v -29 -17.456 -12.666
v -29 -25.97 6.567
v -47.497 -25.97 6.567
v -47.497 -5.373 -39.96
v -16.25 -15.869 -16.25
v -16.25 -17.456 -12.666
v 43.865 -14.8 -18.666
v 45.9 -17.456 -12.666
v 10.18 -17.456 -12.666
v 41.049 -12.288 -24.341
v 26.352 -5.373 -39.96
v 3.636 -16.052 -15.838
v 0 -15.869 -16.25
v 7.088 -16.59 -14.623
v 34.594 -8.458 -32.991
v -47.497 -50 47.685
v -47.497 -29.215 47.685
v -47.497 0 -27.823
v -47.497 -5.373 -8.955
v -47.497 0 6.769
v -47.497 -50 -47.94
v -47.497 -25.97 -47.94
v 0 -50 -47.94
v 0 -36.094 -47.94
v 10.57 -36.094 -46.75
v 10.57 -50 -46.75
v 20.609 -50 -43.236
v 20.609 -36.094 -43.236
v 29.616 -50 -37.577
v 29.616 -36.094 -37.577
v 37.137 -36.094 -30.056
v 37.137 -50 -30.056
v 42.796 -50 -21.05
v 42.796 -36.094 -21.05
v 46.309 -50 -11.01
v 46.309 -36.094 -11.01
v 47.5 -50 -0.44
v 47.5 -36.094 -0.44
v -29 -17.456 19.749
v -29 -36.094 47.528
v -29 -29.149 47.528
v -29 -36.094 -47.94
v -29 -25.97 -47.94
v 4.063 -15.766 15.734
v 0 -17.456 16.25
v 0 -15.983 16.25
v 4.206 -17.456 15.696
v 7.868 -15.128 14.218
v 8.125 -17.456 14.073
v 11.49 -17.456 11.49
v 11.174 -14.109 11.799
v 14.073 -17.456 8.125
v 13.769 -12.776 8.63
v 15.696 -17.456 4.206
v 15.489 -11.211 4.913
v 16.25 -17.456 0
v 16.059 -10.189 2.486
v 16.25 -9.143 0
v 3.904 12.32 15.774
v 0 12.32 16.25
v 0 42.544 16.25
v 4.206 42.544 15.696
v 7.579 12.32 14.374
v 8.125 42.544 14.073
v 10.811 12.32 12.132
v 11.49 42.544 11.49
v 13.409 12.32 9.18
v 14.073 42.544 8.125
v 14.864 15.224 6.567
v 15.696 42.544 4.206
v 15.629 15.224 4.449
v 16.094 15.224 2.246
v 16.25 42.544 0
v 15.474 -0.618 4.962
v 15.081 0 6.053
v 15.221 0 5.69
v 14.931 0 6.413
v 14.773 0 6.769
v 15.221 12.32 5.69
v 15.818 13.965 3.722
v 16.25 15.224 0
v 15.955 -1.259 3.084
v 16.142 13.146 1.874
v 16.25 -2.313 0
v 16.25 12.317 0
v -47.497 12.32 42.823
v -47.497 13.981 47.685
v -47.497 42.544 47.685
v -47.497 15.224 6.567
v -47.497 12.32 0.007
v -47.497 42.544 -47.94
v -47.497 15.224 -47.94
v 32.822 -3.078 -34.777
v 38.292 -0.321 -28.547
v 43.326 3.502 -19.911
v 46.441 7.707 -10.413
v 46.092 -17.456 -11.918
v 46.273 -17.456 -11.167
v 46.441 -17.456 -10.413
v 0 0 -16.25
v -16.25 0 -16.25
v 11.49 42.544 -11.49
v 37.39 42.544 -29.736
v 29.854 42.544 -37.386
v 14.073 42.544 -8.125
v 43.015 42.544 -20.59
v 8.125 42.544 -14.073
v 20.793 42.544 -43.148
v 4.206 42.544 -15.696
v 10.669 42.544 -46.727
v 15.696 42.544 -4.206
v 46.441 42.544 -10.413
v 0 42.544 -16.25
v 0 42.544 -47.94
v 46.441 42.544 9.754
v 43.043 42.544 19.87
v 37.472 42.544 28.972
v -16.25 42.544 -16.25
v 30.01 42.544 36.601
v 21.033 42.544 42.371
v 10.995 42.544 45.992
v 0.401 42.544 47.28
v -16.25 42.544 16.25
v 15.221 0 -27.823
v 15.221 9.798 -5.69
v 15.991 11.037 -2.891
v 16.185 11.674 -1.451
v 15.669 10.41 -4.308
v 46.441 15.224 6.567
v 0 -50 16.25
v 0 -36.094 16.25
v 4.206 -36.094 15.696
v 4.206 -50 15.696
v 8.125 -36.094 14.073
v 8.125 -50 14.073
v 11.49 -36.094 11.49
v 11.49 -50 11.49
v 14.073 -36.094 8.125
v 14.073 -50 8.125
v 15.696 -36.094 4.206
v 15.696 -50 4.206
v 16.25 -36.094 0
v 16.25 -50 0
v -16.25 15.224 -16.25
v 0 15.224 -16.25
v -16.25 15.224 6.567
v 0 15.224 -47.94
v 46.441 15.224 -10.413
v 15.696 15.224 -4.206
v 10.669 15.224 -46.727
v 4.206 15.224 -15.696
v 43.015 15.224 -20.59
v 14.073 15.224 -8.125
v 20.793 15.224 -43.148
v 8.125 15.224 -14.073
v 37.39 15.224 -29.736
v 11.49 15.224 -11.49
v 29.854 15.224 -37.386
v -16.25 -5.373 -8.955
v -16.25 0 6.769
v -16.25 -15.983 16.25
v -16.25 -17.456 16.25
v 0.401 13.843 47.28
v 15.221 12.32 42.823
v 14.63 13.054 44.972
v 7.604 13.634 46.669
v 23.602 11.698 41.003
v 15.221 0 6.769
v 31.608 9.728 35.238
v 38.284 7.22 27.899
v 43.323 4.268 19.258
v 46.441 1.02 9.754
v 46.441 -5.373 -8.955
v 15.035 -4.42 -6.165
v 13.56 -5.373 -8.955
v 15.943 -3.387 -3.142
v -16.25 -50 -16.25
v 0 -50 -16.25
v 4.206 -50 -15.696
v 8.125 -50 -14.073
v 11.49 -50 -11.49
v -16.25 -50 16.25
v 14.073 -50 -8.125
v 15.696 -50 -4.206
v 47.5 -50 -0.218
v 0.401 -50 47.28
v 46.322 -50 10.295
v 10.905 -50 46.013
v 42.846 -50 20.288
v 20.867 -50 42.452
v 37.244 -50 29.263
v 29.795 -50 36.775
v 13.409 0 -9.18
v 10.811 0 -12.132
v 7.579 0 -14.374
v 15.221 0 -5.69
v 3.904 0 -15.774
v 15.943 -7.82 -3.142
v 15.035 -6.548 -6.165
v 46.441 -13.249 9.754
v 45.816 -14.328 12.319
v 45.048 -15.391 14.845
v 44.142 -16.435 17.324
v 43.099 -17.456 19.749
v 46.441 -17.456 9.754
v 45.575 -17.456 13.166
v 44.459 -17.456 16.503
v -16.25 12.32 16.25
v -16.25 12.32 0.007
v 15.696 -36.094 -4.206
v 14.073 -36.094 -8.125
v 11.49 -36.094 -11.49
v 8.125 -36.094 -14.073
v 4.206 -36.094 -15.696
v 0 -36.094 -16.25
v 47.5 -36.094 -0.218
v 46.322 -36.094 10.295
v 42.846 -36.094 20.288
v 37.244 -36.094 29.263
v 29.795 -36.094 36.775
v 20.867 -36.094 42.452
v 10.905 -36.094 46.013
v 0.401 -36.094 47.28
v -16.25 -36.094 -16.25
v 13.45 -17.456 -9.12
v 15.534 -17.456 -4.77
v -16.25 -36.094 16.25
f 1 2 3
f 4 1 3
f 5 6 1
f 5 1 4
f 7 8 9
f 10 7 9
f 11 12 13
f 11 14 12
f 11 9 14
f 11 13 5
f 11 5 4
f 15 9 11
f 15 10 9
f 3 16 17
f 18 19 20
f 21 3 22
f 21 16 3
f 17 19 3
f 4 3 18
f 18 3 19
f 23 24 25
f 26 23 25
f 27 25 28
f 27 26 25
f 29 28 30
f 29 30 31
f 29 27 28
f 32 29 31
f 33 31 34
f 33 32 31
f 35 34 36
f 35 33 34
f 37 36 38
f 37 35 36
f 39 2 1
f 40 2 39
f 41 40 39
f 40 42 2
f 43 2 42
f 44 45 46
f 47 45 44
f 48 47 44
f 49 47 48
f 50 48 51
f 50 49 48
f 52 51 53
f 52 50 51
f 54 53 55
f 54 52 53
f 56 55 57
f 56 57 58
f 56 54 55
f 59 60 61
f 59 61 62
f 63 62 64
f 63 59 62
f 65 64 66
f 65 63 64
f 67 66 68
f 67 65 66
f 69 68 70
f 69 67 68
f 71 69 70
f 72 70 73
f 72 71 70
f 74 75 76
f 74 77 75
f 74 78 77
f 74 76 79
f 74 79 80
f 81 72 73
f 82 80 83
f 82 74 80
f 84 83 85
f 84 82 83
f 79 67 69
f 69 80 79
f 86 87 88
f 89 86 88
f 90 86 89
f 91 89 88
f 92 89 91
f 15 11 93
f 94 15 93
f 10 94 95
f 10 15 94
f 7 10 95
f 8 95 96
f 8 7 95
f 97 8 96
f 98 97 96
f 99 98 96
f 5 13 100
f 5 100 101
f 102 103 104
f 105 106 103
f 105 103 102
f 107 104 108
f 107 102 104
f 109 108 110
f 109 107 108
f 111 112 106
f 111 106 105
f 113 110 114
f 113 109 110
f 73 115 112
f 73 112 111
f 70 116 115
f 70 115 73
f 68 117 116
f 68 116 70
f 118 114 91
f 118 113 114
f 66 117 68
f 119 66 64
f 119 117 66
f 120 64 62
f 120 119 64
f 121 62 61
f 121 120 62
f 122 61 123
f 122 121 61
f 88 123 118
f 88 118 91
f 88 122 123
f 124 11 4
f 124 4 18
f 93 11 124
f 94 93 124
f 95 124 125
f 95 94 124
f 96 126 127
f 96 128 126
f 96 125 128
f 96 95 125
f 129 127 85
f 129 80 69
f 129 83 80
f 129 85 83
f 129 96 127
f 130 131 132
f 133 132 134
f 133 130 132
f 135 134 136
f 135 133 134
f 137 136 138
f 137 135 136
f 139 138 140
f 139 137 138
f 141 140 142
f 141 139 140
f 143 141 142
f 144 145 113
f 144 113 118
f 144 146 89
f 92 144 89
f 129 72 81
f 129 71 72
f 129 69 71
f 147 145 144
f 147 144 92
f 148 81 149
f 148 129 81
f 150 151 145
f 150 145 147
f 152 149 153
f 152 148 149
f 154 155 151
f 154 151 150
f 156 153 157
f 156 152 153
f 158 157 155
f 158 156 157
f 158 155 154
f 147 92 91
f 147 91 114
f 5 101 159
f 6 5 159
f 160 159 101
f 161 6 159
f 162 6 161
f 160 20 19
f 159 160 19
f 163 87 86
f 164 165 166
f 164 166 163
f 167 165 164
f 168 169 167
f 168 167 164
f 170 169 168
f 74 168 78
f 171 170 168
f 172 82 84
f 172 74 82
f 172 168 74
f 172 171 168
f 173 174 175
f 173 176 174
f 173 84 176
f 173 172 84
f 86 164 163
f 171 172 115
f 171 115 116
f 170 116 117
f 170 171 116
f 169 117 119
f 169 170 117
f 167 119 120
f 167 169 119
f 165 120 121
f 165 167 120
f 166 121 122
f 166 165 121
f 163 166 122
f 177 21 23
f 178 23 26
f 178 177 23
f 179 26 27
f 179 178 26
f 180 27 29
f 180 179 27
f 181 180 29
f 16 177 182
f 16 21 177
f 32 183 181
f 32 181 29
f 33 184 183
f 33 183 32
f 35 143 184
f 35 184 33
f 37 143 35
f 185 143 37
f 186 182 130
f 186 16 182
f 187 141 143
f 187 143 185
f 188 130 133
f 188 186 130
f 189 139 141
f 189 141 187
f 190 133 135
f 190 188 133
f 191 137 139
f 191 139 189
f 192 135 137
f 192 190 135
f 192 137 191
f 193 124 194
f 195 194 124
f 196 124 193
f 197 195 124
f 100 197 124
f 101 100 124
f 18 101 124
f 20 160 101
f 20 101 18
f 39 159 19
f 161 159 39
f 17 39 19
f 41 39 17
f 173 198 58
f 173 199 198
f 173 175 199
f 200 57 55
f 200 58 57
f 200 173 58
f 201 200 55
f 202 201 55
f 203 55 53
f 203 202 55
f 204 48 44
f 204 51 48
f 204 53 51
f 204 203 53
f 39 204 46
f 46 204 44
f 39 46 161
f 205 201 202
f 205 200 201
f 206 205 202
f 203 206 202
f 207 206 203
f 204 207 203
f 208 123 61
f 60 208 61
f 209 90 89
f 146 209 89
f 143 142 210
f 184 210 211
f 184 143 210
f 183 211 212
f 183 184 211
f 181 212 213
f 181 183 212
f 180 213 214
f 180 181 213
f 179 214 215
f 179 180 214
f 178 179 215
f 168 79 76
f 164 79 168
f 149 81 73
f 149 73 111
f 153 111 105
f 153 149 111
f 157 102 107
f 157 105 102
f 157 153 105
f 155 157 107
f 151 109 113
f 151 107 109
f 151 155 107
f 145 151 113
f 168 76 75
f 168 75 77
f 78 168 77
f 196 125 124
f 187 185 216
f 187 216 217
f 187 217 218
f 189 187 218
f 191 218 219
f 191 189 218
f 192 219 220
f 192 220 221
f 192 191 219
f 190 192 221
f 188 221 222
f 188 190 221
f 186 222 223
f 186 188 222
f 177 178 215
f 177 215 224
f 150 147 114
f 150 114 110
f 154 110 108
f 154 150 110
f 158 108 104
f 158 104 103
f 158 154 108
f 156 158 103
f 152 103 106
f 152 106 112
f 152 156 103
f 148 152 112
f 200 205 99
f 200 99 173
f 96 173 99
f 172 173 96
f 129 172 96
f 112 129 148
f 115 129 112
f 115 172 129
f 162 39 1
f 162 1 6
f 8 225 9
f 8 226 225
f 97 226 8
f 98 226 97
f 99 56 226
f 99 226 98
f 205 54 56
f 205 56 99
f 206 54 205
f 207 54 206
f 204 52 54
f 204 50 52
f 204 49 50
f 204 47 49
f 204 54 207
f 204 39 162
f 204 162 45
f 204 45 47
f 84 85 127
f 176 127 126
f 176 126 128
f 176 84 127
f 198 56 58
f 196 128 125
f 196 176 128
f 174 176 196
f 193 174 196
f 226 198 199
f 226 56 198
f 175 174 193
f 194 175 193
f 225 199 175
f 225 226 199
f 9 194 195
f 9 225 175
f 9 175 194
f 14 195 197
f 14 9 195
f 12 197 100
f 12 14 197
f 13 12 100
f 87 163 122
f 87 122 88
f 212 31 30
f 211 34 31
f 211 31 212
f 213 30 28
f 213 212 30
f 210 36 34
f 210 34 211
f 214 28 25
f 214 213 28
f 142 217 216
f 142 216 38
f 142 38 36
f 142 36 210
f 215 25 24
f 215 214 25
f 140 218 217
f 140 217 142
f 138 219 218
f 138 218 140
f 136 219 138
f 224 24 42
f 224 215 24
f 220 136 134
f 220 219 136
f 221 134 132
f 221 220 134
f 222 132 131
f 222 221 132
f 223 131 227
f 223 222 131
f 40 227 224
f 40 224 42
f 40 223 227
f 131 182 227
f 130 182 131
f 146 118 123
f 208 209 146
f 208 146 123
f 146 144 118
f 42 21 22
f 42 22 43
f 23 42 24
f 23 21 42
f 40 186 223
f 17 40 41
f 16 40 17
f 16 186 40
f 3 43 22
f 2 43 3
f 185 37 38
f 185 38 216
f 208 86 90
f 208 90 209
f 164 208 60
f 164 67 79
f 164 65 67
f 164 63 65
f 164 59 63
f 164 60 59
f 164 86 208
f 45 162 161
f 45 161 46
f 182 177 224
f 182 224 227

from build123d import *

# Parameters (mm, degrees)
F3_DEPTH = 50
F4_DEPTH = 50
F5_DEPTH = 50


with BuildPart() as f3:
    # F0 (on Top) → F3 (new body, symmetric)
    with BuildSketch(Plane.XY):
        Polygon((50, -36.094326), (30, -36.094326), (-29, -36.094326), (-29, -17.455937), (30, -17.455937), (46.441259, -17.455937), (46.441259, 42.544063), (30, 42.544063), (-50, 42.544063), (-50, 12.319882), (15.221381, 12.319882), (15.221381, 0), (-50, 0), (-50, -50), (30, -50), (50, -50), align=None)
    extrude(amount=F3_DEPTH, both=True)

    # F1 (on Front) → F4 (intersect, symmetric)
    with BuildSketch(Plane.XZ):
        with BuildLine():
            Line((0.401398, 47.279804), (-47.496608, 47.684579))
            Line((-47.496608, 47.684579), (-47.496608, -47.940426))
            Line((-47.496608, -47.940426), (0, -47.940426))
            ThreePointArc((0, -47.940426), (33.587572, -34.027999), (47.5, -0.440426))
            Line((47.5, -0.440426), (47.5, -0.2185))
            ThreePointArc((47.5, -0.2185), (33.729189, 33.226855), (0.401398, 47.279804))
        make_face()
        with BuildLine():
            Line((-16.25, -16.25), (-16.25, 16.25))
            Line((-16.25, 16.25), (0, 16.25))
            ThreePointArc((0, 16.25), (11.490485, 11.490485), (16.25, 0))
            ThreePointArc((16.25, 0), (11.490485, -11.490485), (0, -16.25))
            Line((0, -16.25), (-16.25, -16.25))
        make_face(mode=Mode.SUBTRACT)
    extrude(amount=F4_DEPTH, both=True, mode=Mode.INTERSECT)

    # F2 (on Right) → F5 (intersect, symmetric)
    with BuildSketch(Plane.YZ):
        Polygon((14.925366, 50.447736), (-5.373133, -8.95522), (-29.727991, 48.903065), (-55.721365, 48.903065), (-55.721365, -51.030165), (-25.97014, -50.642264), (-25.97014, 6.567161), (-5.373133, -39.960397), (15.223874, 6.567161), (15.223874, -50.642264), (55.721365, -50.114252), (55.721365, 50.447736), align=None)
    extrude(amount=F5_DEPTH, both=True, mode=Mode.INTERSECT)


solid = f3.part
